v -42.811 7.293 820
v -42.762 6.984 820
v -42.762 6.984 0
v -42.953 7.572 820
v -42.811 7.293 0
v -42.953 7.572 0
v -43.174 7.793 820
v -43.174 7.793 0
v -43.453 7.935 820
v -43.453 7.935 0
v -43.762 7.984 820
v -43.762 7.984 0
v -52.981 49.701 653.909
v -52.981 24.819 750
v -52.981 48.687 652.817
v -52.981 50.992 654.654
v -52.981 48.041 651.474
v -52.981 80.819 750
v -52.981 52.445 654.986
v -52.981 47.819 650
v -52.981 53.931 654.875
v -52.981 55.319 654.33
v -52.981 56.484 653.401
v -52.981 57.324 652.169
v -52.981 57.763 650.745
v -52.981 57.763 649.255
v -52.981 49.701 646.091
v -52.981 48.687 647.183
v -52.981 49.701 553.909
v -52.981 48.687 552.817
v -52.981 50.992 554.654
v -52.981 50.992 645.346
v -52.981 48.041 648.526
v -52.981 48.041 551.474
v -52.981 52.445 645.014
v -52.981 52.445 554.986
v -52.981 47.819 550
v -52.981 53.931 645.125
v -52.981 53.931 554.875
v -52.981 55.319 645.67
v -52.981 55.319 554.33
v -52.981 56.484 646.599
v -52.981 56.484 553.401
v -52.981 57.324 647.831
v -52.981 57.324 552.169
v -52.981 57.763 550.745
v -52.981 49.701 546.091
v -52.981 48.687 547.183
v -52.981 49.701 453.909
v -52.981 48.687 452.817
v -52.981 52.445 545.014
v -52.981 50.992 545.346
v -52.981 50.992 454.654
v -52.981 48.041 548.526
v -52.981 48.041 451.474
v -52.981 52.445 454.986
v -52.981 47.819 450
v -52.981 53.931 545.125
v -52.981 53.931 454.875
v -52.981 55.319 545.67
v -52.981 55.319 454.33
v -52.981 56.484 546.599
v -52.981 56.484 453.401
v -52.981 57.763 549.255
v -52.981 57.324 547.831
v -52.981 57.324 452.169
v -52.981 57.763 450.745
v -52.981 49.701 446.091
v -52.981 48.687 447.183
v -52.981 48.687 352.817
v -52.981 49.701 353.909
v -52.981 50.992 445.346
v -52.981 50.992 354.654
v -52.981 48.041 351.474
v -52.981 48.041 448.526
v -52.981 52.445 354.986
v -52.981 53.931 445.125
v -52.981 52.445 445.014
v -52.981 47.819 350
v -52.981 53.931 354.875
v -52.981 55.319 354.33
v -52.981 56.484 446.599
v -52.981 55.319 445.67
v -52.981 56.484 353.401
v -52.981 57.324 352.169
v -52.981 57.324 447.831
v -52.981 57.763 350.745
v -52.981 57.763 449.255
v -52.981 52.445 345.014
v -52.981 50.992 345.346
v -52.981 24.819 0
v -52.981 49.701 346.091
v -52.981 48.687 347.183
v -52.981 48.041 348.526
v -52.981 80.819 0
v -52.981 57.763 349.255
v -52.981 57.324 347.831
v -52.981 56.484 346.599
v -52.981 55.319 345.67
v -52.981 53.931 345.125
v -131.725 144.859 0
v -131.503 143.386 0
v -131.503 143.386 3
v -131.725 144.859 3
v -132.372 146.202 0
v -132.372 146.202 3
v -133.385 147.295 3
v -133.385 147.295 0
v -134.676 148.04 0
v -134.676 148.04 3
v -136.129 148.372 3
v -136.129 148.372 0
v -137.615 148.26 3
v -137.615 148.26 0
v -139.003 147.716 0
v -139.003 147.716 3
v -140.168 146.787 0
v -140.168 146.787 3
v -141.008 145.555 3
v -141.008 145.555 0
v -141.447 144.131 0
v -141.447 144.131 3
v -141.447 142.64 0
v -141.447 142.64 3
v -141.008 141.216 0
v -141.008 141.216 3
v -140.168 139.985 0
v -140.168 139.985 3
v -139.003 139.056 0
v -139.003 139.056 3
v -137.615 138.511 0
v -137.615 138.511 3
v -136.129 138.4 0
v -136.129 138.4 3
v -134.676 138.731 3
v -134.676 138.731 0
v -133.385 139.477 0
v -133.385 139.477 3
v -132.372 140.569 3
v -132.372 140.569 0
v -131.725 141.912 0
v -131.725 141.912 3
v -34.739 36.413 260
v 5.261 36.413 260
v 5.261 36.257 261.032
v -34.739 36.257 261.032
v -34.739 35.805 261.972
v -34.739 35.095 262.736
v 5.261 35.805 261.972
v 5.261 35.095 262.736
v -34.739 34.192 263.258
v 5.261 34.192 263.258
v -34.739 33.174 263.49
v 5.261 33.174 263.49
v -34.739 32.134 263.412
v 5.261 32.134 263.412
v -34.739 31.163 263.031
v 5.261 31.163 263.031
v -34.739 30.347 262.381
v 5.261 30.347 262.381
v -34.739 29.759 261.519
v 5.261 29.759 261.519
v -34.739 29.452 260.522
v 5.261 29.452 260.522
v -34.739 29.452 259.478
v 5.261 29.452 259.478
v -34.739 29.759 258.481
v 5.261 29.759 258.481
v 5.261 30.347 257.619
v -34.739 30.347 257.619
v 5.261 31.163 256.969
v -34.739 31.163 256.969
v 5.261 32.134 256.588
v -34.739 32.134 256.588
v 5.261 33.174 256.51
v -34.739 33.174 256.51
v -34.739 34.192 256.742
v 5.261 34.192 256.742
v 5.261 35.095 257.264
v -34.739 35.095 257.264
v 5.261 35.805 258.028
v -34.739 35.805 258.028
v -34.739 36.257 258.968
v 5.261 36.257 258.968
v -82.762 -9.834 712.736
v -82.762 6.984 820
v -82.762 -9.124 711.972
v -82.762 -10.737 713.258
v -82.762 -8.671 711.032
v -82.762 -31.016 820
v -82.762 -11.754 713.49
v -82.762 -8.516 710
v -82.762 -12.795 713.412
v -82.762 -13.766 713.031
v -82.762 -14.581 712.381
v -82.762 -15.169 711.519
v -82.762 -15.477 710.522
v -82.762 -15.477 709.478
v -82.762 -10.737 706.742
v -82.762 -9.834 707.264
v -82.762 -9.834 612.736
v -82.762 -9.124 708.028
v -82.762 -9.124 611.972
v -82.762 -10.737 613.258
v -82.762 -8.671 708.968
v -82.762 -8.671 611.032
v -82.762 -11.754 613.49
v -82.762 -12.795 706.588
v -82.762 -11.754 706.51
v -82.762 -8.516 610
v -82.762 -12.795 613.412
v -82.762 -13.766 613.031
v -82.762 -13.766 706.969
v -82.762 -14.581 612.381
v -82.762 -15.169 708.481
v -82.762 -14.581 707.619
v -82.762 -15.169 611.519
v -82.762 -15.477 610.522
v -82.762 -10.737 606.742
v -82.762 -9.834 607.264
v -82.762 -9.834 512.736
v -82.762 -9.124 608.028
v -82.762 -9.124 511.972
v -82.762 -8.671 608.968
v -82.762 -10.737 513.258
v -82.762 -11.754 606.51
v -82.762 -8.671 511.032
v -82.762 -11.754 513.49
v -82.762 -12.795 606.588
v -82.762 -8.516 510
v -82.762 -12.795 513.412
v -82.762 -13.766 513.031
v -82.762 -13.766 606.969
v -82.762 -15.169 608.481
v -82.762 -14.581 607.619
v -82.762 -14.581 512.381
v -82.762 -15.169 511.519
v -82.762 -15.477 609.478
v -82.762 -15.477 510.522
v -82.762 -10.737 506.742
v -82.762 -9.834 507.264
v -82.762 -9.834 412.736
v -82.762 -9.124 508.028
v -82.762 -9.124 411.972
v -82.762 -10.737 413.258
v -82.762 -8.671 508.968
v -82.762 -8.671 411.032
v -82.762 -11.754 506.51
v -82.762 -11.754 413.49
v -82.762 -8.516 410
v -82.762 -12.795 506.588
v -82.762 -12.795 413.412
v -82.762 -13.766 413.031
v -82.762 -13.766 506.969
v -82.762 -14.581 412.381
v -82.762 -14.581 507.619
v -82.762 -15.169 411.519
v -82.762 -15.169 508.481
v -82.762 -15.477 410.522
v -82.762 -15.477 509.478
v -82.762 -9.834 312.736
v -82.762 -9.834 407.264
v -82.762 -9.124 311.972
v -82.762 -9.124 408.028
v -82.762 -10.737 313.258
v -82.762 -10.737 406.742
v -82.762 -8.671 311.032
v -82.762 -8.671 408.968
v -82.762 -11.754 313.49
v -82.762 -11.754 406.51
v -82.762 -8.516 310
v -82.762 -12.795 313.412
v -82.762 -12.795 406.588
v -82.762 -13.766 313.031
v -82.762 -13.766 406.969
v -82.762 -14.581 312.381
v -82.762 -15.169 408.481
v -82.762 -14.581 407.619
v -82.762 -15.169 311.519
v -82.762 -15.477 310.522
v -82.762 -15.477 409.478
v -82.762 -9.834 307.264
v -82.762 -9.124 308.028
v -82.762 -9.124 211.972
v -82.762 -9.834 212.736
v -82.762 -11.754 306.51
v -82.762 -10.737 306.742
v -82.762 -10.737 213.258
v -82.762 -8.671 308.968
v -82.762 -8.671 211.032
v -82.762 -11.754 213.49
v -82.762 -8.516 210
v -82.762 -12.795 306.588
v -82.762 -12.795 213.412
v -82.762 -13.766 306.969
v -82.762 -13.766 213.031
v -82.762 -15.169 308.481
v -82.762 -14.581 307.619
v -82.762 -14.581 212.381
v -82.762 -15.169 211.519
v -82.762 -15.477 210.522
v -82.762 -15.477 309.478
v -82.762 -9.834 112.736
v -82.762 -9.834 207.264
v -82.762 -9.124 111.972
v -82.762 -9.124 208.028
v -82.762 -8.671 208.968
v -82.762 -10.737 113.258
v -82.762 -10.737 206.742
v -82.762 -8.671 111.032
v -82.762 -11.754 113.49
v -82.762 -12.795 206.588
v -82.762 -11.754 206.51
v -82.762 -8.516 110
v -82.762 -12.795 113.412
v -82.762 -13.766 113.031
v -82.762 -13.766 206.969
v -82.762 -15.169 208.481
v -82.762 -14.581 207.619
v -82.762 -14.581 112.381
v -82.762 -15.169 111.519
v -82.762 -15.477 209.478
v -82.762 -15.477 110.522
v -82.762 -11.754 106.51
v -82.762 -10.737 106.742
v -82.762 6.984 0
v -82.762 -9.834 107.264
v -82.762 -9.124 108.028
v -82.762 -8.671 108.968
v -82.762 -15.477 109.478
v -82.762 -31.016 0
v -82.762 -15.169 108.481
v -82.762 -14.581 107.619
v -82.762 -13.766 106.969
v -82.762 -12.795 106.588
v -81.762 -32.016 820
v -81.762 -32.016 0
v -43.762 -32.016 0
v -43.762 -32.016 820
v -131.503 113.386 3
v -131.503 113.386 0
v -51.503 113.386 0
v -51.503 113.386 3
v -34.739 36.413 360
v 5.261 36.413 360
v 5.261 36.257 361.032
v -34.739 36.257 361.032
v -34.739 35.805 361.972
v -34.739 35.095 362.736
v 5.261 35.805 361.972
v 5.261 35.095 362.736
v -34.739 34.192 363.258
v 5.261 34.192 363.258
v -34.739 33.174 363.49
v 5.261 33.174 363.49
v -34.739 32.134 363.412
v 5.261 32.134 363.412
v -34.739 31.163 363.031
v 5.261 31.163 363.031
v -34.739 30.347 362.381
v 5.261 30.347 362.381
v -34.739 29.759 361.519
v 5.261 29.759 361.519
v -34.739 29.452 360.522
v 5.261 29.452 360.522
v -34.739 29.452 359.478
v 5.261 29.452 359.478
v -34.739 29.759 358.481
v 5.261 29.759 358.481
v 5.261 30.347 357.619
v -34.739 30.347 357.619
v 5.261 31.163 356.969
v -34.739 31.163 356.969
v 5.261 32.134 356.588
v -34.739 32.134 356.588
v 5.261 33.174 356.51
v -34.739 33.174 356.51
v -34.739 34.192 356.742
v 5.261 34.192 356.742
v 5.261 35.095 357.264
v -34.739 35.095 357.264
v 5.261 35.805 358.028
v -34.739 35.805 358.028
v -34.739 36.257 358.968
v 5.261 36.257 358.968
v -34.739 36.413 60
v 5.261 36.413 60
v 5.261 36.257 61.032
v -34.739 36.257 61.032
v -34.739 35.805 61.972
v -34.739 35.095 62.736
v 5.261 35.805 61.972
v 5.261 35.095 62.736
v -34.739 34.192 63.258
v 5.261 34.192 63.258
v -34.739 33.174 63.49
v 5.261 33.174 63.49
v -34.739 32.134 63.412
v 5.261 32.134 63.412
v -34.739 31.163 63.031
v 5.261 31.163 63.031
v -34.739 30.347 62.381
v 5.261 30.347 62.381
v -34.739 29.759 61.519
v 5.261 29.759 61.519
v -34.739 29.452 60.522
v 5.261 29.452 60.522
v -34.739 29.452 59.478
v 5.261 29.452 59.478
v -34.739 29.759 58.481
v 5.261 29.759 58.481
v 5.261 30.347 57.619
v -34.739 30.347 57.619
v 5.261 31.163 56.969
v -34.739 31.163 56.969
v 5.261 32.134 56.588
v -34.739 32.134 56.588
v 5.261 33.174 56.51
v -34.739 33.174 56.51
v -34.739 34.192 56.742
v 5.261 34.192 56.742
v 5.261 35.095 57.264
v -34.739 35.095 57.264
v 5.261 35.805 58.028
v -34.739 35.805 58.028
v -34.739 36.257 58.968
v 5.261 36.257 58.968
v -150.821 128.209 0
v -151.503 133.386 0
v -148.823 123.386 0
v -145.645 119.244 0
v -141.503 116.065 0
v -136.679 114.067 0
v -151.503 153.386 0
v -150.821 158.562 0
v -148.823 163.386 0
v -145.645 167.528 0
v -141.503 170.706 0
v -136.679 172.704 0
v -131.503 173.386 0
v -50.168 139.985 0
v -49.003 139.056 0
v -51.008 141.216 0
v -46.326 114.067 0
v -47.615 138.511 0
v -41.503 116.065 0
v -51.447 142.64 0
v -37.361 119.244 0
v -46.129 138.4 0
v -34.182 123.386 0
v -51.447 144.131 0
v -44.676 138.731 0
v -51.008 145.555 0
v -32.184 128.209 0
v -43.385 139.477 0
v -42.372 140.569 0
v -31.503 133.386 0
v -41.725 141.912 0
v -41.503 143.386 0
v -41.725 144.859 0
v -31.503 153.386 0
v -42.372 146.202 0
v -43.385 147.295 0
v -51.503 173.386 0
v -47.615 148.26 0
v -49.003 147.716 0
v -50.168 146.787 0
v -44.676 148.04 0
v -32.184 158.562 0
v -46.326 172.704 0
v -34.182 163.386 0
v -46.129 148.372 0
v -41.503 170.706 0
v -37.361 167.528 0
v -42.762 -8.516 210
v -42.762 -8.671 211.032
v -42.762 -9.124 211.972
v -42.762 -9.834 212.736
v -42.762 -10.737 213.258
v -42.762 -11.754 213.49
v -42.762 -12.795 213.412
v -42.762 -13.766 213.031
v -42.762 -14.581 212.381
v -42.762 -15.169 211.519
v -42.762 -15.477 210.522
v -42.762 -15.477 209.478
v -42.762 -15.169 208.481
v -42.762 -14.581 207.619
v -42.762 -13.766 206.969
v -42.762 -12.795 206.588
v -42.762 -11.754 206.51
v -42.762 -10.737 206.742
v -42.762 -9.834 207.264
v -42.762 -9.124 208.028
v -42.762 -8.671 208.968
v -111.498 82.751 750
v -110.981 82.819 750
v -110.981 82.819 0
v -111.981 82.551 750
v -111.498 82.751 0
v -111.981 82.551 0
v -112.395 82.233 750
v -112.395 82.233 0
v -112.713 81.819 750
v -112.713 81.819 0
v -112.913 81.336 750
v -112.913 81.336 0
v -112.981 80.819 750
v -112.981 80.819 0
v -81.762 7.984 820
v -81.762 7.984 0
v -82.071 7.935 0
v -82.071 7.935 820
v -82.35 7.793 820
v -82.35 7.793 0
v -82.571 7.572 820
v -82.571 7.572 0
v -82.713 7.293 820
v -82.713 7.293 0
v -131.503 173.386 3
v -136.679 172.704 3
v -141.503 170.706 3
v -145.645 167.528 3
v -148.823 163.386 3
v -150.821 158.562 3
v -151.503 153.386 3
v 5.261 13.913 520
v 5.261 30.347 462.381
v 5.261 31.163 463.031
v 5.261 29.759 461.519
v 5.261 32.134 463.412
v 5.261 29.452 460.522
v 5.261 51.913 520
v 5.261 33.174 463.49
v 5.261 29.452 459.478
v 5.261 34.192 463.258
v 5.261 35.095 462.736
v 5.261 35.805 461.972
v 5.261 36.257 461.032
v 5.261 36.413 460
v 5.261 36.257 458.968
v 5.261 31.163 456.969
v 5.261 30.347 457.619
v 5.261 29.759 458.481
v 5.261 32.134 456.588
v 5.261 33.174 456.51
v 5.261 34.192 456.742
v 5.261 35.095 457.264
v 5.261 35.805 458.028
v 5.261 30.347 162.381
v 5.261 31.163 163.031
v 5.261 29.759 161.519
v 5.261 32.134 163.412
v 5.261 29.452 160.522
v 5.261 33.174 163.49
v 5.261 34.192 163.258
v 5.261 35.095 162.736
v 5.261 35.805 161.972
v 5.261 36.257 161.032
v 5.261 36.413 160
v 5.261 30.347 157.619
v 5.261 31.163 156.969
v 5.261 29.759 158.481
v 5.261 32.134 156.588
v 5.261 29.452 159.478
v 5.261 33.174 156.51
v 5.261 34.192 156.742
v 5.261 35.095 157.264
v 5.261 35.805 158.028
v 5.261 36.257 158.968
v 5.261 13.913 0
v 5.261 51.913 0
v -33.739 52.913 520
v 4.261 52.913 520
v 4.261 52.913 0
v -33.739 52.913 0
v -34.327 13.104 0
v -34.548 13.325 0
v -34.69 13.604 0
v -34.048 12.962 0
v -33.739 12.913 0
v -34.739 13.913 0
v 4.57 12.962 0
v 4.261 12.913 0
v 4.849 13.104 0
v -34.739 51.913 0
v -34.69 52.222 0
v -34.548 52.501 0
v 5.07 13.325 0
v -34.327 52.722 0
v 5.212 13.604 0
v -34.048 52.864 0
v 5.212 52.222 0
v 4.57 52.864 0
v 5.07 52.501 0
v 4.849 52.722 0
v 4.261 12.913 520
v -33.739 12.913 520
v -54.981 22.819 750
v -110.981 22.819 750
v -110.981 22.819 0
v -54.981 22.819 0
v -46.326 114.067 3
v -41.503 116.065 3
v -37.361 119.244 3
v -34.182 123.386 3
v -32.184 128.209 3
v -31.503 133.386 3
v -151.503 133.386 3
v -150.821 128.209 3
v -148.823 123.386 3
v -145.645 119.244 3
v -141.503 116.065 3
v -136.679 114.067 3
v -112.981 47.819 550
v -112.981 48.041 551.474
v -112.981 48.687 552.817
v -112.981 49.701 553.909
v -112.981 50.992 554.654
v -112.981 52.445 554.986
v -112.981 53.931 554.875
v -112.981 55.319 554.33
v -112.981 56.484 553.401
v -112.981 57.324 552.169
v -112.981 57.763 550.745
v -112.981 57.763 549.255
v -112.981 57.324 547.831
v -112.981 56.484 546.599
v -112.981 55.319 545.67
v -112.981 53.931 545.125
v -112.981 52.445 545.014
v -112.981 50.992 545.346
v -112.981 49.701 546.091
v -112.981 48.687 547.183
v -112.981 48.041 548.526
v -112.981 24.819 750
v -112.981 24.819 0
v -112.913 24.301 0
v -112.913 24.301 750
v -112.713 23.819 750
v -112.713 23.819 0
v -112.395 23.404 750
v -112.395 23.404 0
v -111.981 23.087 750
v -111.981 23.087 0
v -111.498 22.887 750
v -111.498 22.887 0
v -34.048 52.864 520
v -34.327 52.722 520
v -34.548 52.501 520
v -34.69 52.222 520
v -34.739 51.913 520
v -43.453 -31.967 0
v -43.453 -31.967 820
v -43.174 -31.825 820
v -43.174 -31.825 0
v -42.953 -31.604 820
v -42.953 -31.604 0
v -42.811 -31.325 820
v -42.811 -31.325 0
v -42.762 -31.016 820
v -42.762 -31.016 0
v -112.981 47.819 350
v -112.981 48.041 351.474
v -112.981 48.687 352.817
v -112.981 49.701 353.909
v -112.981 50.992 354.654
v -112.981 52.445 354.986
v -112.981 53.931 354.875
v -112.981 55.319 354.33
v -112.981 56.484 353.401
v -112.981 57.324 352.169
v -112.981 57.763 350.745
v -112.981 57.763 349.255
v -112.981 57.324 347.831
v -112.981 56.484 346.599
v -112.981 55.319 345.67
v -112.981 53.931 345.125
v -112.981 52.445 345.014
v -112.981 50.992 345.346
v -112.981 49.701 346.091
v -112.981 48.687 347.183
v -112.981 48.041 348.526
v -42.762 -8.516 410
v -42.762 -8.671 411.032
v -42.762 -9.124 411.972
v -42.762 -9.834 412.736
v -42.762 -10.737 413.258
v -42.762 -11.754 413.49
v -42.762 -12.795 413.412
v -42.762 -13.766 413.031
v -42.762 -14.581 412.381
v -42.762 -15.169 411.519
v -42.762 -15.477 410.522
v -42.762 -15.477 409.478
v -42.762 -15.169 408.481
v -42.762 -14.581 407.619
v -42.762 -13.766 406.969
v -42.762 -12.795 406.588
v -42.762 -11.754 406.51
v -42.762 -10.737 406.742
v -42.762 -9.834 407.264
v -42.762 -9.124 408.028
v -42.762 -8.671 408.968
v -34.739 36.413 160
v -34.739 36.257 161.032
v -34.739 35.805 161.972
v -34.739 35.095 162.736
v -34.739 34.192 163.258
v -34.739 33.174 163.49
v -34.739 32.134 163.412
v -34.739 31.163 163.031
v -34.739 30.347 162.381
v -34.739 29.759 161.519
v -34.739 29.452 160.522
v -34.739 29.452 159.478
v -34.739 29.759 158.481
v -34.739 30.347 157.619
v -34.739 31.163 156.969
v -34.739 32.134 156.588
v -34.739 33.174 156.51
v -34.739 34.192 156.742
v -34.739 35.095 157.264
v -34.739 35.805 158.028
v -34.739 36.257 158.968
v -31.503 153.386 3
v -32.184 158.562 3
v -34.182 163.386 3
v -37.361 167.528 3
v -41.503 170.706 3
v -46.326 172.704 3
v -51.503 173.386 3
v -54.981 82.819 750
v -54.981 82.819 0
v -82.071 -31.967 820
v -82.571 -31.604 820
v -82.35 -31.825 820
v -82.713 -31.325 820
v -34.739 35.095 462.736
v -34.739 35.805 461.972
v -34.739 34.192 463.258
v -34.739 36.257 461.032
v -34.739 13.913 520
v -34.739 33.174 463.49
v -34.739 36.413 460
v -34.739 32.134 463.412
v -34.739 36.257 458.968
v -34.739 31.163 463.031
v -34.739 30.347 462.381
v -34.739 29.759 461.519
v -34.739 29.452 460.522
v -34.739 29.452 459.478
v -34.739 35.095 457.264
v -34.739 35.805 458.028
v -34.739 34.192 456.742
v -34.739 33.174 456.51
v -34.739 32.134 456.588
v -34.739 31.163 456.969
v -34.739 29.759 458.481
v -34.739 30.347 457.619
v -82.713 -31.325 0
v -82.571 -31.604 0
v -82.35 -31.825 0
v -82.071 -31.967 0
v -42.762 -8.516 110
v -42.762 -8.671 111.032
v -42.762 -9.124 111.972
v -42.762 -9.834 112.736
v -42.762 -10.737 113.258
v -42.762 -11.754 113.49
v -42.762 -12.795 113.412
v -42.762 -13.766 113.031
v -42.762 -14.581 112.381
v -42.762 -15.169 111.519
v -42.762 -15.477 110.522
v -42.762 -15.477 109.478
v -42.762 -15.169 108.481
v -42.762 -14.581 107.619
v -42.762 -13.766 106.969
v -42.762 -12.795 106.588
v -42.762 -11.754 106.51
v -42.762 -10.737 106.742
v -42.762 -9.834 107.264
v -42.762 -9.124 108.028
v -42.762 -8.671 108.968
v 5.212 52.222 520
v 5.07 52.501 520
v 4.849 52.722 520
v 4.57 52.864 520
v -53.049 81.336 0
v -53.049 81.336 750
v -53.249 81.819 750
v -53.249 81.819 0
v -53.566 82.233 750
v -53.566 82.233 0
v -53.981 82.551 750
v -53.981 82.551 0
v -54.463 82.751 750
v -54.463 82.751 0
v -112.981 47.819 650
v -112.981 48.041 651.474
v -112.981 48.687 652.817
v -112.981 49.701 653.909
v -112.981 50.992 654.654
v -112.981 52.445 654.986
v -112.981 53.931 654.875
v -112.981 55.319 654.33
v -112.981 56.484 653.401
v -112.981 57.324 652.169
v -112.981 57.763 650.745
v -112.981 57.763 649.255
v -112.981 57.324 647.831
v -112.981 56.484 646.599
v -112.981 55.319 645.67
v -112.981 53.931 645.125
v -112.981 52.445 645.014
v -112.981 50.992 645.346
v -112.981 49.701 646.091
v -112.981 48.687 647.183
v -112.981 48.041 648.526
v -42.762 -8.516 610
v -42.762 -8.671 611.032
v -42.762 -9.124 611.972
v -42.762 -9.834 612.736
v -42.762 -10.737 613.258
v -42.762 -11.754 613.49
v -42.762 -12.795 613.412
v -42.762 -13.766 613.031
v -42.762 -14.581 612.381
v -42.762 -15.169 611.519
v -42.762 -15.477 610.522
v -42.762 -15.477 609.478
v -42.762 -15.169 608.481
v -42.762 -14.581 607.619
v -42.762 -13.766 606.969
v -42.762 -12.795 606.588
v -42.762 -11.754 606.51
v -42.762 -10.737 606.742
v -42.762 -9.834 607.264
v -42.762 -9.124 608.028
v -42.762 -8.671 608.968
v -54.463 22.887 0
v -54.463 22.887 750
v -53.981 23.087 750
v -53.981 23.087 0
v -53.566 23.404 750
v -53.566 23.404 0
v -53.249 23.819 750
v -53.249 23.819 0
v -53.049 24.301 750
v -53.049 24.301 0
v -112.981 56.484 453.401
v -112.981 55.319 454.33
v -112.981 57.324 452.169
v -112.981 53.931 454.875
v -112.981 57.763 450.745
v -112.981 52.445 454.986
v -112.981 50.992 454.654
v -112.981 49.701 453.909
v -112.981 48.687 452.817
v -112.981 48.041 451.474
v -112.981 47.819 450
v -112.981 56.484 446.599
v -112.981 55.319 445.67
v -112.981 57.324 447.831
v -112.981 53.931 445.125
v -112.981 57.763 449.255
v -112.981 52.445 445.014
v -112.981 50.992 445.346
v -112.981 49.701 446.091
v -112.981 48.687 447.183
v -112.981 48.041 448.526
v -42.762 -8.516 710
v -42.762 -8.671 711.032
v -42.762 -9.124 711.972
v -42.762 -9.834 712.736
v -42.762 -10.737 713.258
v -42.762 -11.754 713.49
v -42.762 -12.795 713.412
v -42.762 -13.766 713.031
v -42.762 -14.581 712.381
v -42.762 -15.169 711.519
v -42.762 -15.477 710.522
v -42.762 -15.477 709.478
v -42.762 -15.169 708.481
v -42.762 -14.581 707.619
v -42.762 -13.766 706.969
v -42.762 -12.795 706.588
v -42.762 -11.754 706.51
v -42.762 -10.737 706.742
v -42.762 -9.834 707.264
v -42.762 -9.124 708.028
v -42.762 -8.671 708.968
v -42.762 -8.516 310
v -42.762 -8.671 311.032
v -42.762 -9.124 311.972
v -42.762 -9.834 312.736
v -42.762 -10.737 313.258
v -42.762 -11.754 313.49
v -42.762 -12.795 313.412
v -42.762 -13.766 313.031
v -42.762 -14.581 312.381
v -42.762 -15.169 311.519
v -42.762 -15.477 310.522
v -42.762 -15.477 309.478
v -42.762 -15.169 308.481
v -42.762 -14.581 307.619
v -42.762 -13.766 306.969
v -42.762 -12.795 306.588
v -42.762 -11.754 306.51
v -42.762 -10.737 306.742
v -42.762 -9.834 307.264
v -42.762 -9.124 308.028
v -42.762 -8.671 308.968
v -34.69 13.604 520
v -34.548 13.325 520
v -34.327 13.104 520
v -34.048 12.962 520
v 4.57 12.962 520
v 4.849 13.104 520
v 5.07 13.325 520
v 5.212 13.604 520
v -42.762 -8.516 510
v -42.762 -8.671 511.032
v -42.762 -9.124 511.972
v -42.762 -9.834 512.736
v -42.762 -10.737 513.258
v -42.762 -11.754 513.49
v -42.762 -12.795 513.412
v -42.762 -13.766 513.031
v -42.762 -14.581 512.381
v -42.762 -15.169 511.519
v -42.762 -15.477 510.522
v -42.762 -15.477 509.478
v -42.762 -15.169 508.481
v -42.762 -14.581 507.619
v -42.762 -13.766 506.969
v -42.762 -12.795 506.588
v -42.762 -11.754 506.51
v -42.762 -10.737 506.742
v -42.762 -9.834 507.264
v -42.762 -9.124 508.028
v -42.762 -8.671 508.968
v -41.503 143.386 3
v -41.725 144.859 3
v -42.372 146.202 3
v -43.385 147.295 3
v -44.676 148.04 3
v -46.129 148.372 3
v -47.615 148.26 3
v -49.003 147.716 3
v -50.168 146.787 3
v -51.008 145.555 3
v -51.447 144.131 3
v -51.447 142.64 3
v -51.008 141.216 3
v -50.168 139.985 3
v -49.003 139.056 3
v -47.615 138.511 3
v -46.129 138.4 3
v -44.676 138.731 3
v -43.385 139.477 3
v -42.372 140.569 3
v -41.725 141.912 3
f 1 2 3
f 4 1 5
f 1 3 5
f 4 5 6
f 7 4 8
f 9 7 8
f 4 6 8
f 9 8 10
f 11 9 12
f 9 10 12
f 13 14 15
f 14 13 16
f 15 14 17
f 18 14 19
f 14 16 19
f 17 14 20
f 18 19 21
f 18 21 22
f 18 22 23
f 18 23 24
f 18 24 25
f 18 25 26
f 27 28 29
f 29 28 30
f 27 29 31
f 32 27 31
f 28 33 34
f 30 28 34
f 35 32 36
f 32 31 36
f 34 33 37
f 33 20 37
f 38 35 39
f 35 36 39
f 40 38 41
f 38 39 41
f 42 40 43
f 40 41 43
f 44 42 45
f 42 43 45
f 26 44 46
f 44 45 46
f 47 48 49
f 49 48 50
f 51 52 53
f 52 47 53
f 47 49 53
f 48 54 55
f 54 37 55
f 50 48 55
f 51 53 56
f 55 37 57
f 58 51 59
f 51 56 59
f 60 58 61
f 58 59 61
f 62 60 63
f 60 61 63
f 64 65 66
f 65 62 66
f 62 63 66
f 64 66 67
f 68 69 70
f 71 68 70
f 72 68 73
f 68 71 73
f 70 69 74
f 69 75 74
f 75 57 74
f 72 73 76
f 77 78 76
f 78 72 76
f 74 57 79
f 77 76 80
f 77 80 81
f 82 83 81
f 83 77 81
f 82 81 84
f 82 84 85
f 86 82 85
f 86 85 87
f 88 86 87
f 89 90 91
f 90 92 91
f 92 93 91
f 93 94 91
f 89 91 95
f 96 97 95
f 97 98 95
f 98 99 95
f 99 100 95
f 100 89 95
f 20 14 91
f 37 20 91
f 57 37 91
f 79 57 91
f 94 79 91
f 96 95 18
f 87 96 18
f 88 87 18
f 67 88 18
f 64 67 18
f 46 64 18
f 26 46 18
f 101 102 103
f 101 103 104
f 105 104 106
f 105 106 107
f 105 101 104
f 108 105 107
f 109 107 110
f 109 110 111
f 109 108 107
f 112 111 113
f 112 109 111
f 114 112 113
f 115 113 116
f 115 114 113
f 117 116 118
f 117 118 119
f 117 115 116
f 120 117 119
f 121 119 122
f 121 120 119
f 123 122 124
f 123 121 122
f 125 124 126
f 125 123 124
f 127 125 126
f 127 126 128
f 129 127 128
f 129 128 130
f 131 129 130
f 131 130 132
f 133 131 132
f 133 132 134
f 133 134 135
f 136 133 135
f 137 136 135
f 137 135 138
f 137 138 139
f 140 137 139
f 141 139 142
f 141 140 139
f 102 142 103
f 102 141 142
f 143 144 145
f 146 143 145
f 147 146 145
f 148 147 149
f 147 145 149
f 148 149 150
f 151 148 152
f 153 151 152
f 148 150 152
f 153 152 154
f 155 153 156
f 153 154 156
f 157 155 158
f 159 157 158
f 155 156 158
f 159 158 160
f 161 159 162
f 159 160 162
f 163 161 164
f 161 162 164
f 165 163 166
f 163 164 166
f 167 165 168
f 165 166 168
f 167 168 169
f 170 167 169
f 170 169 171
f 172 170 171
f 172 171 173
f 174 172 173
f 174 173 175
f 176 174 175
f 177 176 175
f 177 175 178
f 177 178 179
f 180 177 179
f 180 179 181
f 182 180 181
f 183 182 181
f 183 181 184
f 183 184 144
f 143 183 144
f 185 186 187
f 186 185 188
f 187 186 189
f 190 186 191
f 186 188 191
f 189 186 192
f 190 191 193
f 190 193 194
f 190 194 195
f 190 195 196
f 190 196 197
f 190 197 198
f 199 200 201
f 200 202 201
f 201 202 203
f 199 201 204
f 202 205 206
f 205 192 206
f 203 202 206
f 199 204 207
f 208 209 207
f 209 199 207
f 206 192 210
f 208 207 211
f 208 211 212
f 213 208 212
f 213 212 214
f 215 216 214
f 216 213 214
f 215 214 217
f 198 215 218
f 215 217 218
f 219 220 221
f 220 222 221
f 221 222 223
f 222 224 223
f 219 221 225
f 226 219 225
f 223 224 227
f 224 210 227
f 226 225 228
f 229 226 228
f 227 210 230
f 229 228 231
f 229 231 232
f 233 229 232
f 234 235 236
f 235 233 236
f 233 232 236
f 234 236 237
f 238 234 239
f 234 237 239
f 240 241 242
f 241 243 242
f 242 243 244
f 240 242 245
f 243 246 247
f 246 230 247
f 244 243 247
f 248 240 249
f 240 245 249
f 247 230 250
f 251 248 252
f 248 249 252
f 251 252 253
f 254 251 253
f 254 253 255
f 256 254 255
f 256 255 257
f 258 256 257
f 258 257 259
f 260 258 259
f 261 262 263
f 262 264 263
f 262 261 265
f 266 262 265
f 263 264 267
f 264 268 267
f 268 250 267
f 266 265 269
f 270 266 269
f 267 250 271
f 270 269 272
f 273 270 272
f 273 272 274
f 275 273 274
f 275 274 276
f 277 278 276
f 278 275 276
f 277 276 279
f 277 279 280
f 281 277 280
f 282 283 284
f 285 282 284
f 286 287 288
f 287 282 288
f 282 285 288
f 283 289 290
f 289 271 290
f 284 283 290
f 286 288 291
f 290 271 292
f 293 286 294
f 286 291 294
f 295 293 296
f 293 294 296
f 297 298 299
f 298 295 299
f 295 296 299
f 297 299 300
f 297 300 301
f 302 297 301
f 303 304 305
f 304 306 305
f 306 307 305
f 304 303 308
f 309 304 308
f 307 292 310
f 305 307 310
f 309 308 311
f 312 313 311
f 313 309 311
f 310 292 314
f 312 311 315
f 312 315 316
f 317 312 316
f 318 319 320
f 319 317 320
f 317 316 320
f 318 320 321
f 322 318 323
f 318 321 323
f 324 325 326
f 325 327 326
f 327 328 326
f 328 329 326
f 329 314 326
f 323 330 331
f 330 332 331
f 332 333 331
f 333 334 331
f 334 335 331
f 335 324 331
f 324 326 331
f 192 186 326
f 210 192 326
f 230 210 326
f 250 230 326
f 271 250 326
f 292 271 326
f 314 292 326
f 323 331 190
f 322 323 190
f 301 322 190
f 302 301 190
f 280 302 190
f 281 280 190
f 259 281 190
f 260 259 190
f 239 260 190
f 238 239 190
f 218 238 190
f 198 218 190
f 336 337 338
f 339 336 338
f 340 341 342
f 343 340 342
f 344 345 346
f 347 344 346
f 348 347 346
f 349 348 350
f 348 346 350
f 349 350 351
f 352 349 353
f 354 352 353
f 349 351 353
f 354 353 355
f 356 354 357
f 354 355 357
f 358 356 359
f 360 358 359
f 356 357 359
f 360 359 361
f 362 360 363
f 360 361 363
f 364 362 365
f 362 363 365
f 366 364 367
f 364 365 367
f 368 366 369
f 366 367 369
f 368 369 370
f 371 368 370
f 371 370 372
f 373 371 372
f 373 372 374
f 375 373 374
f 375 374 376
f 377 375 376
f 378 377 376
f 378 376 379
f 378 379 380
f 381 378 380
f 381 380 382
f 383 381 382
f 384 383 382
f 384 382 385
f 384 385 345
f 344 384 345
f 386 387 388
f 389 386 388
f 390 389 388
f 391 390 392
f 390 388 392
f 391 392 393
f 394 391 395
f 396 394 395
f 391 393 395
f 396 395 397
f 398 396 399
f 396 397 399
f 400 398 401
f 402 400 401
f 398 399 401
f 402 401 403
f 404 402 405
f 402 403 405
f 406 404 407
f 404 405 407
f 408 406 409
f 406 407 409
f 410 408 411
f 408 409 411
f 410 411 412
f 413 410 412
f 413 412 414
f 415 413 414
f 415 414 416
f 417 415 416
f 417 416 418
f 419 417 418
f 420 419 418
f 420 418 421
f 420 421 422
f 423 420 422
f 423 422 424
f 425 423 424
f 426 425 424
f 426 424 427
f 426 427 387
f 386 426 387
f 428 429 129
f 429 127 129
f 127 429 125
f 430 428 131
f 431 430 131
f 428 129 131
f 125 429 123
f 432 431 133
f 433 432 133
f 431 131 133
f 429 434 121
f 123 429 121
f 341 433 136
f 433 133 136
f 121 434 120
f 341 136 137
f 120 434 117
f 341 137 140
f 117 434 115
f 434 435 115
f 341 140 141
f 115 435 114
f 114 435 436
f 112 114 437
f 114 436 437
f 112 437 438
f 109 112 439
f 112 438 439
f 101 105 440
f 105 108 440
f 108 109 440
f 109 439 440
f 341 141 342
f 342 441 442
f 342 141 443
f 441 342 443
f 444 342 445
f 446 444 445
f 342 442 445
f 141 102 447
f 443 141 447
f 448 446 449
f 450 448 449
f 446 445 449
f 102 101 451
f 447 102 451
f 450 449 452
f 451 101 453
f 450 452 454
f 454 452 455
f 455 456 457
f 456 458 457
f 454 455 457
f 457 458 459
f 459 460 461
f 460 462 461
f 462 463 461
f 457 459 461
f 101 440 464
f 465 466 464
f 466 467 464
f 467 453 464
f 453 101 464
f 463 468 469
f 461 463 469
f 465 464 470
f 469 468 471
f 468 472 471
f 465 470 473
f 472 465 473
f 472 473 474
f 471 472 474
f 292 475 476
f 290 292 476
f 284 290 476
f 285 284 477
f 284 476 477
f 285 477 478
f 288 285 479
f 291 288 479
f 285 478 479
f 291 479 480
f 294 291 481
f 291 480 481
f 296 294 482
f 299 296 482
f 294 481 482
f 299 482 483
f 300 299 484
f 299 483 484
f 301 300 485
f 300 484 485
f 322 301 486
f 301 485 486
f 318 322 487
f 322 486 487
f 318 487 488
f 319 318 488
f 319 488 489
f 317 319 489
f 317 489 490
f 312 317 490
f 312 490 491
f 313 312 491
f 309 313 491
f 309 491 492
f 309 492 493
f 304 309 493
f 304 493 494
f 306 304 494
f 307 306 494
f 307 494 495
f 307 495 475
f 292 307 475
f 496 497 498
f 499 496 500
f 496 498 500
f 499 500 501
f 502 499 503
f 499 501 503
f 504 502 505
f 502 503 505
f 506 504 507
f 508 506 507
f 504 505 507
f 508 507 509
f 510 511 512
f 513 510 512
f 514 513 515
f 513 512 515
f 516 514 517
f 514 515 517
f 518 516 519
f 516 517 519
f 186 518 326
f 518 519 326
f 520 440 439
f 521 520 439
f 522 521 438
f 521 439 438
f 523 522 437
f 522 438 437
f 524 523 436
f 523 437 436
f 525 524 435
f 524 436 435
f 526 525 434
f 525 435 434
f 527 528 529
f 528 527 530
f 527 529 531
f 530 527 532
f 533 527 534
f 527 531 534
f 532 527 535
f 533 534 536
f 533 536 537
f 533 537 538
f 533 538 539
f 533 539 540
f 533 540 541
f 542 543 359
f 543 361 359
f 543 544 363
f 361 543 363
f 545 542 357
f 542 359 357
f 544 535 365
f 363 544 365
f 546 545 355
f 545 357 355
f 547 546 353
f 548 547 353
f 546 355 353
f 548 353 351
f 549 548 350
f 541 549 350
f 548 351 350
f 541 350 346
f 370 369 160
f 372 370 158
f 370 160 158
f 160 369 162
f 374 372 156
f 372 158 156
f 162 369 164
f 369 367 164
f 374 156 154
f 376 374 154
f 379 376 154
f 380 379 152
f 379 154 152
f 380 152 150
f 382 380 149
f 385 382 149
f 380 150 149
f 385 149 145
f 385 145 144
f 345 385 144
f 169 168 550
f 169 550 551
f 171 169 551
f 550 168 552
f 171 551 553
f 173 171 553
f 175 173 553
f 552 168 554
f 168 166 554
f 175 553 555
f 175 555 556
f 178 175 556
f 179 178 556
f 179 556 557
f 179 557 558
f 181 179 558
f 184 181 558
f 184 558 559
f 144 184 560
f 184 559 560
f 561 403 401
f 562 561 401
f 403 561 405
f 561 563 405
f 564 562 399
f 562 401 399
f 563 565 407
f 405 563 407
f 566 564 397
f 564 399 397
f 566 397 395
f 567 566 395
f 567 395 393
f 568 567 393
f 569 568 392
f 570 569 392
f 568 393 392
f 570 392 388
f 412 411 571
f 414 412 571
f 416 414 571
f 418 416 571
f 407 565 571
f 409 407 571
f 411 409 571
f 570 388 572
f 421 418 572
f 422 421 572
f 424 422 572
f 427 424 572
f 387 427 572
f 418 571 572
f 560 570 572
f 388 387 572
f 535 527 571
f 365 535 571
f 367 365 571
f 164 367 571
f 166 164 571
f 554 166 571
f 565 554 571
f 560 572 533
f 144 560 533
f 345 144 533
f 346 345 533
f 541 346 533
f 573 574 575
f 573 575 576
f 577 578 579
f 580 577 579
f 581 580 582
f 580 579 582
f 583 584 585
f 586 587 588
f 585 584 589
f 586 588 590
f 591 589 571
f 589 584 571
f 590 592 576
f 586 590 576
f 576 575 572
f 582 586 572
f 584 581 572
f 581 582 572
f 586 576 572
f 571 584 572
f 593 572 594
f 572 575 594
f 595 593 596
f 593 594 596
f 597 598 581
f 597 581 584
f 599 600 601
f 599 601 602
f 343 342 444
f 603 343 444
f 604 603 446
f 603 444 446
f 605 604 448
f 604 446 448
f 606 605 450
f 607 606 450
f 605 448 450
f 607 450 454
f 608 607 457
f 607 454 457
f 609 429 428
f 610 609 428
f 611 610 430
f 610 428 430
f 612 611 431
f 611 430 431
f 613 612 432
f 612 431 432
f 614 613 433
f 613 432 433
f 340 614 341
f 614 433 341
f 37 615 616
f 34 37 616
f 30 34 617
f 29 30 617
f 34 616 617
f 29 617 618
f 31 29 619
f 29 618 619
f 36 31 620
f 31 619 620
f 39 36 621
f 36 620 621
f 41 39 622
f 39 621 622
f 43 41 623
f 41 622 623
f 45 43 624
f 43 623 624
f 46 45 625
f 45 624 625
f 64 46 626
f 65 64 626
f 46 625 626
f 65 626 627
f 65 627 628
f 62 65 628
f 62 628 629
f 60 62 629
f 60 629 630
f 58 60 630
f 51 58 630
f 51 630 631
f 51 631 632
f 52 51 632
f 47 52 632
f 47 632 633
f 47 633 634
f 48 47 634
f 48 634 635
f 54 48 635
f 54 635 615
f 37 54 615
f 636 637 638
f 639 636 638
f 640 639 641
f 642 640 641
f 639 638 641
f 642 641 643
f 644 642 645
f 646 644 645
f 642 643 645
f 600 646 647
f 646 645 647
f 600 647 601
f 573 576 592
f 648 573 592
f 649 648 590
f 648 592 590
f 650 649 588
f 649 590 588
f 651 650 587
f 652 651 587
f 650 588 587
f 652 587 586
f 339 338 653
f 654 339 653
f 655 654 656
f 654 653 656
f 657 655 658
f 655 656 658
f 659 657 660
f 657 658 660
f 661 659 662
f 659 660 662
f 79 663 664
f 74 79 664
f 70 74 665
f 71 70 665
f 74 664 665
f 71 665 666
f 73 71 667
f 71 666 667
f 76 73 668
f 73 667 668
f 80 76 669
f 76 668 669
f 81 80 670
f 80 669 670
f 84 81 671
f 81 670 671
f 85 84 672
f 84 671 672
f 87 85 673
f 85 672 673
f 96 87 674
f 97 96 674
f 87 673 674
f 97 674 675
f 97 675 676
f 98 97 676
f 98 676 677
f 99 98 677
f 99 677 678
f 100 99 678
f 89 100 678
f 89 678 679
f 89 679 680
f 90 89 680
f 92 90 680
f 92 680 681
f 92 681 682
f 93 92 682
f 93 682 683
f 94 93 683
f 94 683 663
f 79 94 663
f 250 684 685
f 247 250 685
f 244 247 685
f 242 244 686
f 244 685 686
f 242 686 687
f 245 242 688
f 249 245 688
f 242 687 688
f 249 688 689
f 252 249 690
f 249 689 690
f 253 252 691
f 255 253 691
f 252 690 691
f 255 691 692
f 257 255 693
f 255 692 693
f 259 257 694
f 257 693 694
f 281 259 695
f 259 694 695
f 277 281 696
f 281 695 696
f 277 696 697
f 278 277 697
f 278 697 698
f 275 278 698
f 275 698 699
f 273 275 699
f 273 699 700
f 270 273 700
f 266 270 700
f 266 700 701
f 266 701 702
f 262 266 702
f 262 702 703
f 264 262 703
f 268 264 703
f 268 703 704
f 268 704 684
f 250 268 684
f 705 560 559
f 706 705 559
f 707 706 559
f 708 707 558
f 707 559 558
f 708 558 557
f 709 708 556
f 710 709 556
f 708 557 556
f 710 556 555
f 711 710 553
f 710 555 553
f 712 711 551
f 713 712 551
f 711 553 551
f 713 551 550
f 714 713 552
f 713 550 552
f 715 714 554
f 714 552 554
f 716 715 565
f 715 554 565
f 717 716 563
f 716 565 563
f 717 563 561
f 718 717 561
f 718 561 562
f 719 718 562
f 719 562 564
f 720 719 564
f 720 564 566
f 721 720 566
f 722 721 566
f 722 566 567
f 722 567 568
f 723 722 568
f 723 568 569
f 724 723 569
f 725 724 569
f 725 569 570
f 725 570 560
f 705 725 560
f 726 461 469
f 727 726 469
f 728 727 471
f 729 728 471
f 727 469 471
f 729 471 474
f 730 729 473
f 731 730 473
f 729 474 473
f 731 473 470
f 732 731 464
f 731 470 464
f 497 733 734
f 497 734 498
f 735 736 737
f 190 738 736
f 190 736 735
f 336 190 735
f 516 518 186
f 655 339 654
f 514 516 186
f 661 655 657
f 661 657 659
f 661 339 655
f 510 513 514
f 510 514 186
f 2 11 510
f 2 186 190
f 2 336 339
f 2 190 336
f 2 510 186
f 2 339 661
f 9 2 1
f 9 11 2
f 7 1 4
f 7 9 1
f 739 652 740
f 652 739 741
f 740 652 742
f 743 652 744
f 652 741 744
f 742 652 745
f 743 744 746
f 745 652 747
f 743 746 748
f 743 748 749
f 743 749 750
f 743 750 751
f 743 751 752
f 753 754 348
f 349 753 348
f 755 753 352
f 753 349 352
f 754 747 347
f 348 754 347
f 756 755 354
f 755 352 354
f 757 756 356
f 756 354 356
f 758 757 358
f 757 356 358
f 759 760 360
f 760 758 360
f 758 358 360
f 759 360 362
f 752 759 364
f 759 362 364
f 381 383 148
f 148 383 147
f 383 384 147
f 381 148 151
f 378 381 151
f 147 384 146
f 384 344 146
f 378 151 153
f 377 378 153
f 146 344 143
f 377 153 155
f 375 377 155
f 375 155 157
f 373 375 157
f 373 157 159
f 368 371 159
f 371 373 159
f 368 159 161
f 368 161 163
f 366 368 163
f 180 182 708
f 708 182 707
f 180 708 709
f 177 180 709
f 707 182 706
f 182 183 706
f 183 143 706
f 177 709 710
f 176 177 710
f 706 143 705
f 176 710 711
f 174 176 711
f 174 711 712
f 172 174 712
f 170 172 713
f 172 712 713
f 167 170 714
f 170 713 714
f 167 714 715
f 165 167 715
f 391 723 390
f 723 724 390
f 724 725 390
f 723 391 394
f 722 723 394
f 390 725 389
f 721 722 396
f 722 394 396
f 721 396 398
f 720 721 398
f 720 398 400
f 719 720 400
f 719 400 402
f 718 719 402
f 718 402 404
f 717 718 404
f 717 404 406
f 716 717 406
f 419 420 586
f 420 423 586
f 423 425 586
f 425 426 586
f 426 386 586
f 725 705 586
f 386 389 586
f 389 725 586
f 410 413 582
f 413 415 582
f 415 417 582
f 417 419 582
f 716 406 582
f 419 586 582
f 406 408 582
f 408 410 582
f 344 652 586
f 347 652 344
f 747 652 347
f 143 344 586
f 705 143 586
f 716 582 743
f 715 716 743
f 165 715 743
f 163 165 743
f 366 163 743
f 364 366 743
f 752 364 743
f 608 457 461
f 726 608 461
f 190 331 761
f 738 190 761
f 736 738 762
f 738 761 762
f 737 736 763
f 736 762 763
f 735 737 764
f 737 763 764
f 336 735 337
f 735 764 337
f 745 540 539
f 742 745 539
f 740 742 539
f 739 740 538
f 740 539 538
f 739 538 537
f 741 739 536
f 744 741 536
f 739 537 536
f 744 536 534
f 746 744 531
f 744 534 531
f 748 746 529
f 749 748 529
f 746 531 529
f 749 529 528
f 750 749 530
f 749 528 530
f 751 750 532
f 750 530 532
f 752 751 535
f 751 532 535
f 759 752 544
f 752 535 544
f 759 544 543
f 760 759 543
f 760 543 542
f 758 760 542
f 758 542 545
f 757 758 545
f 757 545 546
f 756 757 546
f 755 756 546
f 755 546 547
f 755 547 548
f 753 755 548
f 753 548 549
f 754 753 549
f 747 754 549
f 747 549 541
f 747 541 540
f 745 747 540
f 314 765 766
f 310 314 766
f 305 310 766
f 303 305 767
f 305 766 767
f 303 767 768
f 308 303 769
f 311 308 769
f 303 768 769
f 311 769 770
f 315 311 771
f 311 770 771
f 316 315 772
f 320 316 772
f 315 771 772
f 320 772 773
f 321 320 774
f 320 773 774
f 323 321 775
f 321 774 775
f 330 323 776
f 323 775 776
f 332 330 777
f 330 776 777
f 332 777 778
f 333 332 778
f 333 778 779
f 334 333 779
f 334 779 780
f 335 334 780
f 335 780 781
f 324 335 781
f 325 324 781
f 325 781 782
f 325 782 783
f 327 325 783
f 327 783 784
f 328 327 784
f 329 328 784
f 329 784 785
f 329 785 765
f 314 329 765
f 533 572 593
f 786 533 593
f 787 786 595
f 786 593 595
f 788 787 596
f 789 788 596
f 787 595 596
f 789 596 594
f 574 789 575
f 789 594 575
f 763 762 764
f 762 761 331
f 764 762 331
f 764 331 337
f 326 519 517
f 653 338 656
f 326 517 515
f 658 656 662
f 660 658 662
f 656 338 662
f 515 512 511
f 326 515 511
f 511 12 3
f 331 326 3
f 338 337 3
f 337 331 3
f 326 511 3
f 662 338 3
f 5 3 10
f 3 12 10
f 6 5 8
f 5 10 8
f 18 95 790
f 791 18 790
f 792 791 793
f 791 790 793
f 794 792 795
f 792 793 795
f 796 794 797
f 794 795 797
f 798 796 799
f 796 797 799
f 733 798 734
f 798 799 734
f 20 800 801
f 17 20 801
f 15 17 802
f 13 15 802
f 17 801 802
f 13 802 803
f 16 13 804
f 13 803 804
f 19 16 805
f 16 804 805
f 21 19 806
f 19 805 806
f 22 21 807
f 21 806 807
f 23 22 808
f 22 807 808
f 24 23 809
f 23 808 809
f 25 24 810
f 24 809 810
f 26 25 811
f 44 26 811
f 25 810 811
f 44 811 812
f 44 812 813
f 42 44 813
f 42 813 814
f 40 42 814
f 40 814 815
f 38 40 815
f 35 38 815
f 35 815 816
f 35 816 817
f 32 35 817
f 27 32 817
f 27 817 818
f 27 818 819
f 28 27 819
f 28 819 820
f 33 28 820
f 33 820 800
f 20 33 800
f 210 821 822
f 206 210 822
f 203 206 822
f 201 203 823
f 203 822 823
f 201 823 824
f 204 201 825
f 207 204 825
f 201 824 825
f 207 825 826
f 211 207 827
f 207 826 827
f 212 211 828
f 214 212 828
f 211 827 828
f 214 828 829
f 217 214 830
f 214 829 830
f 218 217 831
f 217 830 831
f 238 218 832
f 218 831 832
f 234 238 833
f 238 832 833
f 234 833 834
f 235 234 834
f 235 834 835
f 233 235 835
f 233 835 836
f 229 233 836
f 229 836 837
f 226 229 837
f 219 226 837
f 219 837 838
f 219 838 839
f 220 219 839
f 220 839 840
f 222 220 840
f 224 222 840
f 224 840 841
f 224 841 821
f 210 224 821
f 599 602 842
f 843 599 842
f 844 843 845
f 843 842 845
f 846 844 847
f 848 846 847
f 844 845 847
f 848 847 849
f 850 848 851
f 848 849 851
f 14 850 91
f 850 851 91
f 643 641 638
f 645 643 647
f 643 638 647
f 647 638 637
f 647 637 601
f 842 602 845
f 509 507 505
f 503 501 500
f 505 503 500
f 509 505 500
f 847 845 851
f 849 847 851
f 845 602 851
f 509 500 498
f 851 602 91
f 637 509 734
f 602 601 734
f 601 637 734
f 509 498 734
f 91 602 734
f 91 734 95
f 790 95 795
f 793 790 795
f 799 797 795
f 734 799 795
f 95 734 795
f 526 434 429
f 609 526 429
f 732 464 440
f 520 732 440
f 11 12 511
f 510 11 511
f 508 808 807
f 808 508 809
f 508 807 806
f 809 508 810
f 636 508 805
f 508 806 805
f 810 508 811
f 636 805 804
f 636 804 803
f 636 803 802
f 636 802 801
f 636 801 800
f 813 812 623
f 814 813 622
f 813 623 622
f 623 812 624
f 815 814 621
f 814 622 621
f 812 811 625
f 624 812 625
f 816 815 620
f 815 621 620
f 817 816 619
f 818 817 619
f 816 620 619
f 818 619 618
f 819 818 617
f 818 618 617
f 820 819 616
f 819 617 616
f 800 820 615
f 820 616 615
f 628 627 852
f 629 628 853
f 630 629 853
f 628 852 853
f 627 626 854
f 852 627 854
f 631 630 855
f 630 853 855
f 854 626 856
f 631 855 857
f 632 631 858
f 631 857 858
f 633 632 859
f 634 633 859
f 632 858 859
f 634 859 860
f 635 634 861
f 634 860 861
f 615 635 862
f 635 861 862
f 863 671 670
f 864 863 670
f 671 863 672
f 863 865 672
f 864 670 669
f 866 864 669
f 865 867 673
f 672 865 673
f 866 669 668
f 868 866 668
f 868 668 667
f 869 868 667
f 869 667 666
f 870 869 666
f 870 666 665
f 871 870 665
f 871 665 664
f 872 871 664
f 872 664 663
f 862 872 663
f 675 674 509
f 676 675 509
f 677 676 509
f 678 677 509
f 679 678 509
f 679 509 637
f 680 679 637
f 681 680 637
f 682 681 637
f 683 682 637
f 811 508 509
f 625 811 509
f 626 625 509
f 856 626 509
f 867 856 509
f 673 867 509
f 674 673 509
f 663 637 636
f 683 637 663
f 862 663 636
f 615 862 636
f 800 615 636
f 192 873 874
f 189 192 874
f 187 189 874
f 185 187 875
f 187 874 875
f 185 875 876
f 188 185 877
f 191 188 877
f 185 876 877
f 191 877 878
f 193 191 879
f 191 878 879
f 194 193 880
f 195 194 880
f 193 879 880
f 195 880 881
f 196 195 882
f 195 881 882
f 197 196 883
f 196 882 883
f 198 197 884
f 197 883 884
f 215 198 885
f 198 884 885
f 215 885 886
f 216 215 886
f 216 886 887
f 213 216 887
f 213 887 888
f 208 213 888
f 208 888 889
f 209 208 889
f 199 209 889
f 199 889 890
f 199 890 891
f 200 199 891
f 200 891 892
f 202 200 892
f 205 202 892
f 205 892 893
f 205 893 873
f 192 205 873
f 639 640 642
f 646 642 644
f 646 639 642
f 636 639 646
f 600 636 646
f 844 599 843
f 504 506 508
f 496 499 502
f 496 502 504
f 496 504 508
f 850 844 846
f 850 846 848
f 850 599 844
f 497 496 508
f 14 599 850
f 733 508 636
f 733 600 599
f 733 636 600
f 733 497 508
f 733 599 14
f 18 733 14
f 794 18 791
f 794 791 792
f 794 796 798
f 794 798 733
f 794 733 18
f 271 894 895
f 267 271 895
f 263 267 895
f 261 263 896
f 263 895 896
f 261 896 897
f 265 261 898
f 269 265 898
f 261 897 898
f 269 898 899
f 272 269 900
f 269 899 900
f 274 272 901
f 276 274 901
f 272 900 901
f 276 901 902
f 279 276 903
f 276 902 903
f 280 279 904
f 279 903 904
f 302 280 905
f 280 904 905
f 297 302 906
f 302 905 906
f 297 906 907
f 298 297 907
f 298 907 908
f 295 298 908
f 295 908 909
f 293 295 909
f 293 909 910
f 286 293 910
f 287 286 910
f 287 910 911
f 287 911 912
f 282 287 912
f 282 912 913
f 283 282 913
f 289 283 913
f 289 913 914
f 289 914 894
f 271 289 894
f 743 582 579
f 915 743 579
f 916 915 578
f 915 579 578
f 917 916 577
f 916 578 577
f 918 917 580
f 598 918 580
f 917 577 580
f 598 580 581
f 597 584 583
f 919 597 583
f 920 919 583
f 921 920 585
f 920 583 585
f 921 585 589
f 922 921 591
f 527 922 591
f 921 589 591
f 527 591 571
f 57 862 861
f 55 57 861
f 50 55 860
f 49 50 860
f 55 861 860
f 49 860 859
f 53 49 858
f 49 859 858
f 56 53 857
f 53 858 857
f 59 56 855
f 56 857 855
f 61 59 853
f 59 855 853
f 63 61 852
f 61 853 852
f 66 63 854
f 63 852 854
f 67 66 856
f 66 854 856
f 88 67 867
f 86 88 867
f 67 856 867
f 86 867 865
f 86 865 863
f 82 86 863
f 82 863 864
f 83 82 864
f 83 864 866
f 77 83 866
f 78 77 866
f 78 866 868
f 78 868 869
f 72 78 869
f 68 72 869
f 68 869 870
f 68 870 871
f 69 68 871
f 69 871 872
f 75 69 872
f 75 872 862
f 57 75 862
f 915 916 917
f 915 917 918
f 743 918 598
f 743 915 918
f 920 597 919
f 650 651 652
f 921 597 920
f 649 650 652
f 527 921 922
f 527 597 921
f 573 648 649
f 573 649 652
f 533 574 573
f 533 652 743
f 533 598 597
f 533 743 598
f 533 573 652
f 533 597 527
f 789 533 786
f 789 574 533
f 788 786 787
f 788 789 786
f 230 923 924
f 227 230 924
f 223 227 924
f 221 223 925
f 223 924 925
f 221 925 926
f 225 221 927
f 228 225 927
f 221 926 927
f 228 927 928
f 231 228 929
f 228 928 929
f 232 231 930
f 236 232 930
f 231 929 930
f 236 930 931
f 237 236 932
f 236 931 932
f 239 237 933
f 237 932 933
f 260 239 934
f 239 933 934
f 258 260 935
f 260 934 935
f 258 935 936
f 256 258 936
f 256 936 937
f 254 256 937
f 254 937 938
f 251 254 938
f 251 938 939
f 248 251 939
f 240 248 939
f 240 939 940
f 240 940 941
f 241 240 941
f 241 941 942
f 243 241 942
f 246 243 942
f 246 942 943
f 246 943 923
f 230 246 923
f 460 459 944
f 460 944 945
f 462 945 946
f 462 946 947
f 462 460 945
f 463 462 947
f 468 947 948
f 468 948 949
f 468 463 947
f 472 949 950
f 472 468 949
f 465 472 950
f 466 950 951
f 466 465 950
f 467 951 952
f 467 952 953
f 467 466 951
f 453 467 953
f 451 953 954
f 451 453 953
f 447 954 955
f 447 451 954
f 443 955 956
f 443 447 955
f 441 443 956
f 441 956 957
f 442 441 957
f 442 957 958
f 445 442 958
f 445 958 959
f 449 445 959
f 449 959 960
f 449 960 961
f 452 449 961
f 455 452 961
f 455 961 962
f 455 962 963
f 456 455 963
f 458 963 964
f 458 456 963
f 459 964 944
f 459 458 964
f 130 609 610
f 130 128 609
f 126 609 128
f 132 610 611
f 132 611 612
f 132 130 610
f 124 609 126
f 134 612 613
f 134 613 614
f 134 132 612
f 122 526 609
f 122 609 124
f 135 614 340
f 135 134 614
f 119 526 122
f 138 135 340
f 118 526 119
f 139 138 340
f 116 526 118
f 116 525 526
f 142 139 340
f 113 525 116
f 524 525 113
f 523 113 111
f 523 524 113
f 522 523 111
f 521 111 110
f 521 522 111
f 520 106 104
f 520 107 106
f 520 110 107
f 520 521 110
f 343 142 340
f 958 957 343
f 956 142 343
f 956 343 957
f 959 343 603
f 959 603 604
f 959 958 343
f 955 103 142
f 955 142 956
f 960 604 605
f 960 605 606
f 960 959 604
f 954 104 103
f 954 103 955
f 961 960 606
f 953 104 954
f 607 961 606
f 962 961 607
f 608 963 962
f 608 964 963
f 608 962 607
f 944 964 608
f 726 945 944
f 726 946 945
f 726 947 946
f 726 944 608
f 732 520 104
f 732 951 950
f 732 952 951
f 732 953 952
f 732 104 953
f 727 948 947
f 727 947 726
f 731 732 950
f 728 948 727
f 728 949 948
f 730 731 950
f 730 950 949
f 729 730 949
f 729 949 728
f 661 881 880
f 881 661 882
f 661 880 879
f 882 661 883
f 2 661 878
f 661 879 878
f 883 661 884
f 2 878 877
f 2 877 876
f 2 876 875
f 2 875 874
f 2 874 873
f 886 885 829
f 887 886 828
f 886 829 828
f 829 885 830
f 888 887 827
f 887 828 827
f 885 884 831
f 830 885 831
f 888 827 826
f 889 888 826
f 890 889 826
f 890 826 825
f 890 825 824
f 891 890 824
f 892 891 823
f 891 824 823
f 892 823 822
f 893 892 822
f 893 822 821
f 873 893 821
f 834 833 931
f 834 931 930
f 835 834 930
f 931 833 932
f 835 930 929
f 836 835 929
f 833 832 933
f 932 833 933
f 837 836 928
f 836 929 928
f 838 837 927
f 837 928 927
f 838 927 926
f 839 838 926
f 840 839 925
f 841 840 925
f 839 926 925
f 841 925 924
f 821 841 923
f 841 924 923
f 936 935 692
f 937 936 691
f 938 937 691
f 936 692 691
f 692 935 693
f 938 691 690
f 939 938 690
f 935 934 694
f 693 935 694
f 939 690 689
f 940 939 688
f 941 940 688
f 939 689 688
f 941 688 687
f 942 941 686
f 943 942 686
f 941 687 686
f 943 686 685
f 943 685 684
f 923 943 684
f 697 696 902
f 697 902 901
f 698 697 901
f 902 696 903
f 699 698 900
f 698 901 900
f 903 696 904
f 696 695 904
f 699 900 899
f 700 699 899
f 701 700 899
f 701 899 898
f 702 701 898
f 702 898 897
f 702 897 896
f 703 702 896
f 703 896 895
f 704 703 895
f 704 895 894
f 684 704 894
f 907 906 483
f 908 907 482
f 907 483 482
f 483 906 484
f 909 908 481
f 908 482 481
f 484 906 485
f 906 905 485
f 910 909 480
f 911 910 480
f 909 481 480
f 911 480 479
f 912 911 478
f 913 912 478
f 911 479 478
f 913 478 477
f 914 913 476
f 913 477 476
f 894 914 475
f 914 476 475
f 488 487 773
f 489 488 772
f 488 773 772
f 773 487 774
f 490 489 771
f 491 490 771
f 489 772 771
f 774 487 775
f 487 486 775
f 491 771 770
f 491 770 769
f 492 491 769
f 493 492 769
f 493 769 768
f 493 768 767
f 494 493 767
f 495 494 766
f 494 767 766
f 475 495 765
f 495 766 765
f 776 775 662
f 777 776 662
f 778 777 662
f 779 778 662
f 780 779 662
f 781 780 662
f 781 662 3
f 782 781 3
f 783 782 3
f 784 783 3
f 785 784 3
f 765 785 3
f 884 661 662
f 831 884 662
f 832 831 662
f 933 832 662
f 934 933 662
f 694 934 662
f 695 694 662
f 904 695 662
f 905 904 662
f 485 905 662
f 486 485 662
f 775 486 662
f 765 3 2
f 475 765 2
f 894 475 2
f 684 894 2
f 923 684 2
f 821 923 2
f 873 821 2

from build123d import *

# Parameters (mm, degrees)
F1_DEPTH  = 750
F3_DEPTH  = 520
F5_DEPTH  = 820
F6_R      = 5
F7_DEPTH  = 118.2429433809
F8_R      = 5
F9_DEPTH  = 3
F10_R     = 3.5
F11_DEPTH = 108.7418225238
F12_R     = 3.5
F13_DEPTH = 156.7649812082


with BuildPart() as f1:
    # F0 (on Top) → F1 (new body)
    with BuildSketch(Plane.XY):
        with BuildLine():
            Line((-54.9806970424, 82.8186849058), (-110.9806970424, 82.8186849058))
            ThreePointArc((-110.9806970424, 82.8186849058), (-112.3949106048, 82.2328984681), (-112.9806970424, 80.8186849058))
            Line((-112.9806970424, 80.8186849058), (-112.9806970424, 24.8186849058))
            ThreePointArc((-112.9806970424, 24.8186849058), (-112.3949106048, 23.4044713434), (-110.9806970424, 22.8186849058))
            Line((-110.9806970424, 22.8186849058), (-54.9806970424, 22.8186849058))
            ThreePointArc((-54.9806970424, 22.8186849058), (-53.56648348, 23.4044713434), (-52.9806970424, 24.8186849058))
            Line((-52.9806970424, 24.8186849058), (-52.9806970424, 80.8186849058))
            ThreePointArc((-52.9806970424, 80.8186849058), (-53.56648348, 82.2328984681), (-54.9806970424, 82.8186849058))
        make_face()
    extrude(amount=F1_DEPTH)

    # F6 (on face) → F7 (cut, through all)
    with BuildSketch(Plane(origin=(-112.9806970424, 0, 0), x_dir=(0, -1, 0), z_dir=(-1, 0, 0))):
        with Locations((-52.8186849058, 650)):
            Circle(F6_R)
        with Locations((-52.8186849058, 550)):
            Circle(F6_R)
        with Locations((-52.8186849058, 450)):
            Circle(F6_R)
        with Locations((-52.8186849058, 350)):
            Circle(F6_R)
    extrude(amount=-F7_DEPTH, mode=Mode.SUBTRACT)


with BuildPart() as f3:
    # F2 (on Top) → F3 (new body)
    with BuildSketch(Plane.XY):
        with BuildLine():
            Line((4.2612463385, 52.912817955), (-33.7387536615, 52.912817955))
            ThreePointArc((-33.7387536615, 52.912817955), (-34.4458604427, 52.6199247362), (-34.7387536615, 51.912817955))
            Line((-34.7387536615, 51.912817955), (-34.7387536615, 13.912817955))
            ThreePointArc((-34.7387536615, 13.912817955), (-34.4458604427, 13.2057111738), (-33.7387536615, 12.912817955))
            Line((-33.7387536615, 12.912817955), (4.2612463385, 12.912817955))
            ThreePointArc((4.2612463385, 12.912817955), (4.9683531197, 13.2057111738), (5.2612463385, 13.912817955))
            Line((5.2612463385, 13.912817955), (5.2612463385, 51.912817955))
            ThreePointArc((5.2612463385, 51.912817955), (4.9683531197, 52.6199247362), (4.2612463385, 52.912817955))
        make_face()
    extrude(amount=F3_DEPTH)

    # F12 (on face) → F13 (cut, through all)
    with BuildSketch(Plane.YZ.offset(5.2612463385)):
        with Locations((32.912817955, 260)):
            Circle(F12_R)
        with Locations((32.912817955, 360)):
            Circle(F12_R)
        with Locations((32.912817955, 460)):
            Circle(F12_R)
        with Locations((32.912817955, 160)):
            Circle(F12_R)
        with Locations((32.912817955, 60)):
            Circle(F12_R)
    extrude(amount=-F13_DEPTH, mode=Mode.SUBTRACT)


with BuildPart() as f5:
    # F4 (on Top) → F5 (new body)
    with BuildSketch(Plane.XY):
        with BuildLine():
            Line((-43.7619123459, 7.984181866), (-81.7619123459, 7.984181866))
            ThreePointArc((-81.7619123459, 7.984181866), (-82.4690191271, 7.6912886472), (-82.7619123459, 6.984181866))
            Line((-82.7619123459, 6.984181866), (-82.7619123459, -31.015818134))
            ThreePointArc((-82.7619123459, -31.015818134), (-82.4690191271, -31.7229249151), (-81.7619123459, -32.015818134))
            Line((-81.7619123459, -32.015818134), (-43.7619123459, -32.015818134))
            ThreePointArc((-43.7619123459, -32.015818134), (-43.0548055647, -31.7229249151), (-42.7619123459, -31.015818134))
            Line((-42.7619123459, -31.015818134), (-42.7619123459, 6.984181866))
            ThreePointArc((-42.7619123459, 6.984181866), (-43.0548055647, 7.6912886472), (-43.7619123459, 7.984181866))
        make_face()
    extrude(amount=F5_DEPTH)

    # F10 (on face) → F11 (cut, through all)
    with BuildSketch(Plane.YZ.offset(-42.7619123459)):
        with Locations((-12.015818134, 410)):
            Circle(F10_R)
        with Locations((-12.015818134, 510)):
            Circle(F10_R)
        with Locations((-12.015818134, 610)):
            Circle(F10_R)
        with Locations((-12.015818134, 710)):
            Circle(F10_R)
        with Locations((-12.015818134, 310)):
            Circle(F10_R)
        with Locations((-12.015818134, 210)):
            Circle(F10_R)
        with Locations((-12.015818134, 110)):
            Circle(F10_R)
    extrude(amount=-F11_DEPTH, mode=Mode.SUBTRACT)


with BuildPart() as f9:
    # F8 (on Top) → F9 (new body)
    with BuildSketch(Plane.XY):
        with BuildLine():
            Line((-51.5027348697, 173.3856686354), (-131.5027348697, 173.3856686354))
            ThreePointArc((-131.5027348697, 173.3856686354), (-145.6448704934, 167.5278042591), (-151.5027348697, 153.3856686354))
            Line((-151.5027348697, 153.3856686354), (-151.5027348697, 133.3856686354))
            ThreePointArc((-151.5027348697, 133.3856686354), (-145.6448704934, 119.2435330116), (-131.5027348697, 113.3856686354))
            Line((-131.5027348697, 113.3856686354), (-51.5027348697, 113.3856686354))
            ThreePointArc((-51.5027348697, 113.3856686354), (-37.360599246, 119.2435330116), (-31.5027348697, 133.3856686354))
            Line((-31.5027348697, 133.3856686354), (-31.5027348697, 153.3856686354))
            ThreePointArc((-31.5027348697, 153.3856686354), (-37.360599246, 167.5278042591), (-51.5027348697, 173.3856686354))
        make_face()
        with Locations((-46.5027348697, 143.3856686354)):
            Circle(F8_R, mode=Mode.SUBTRACT)
        with Locations((-136.5027348697, 143.3856686354)):
            Circle(F8_R, mode=Mode.SUBTRACT)
    extrude(amount=F9_DEPTH)


solid = Compound([f1.part, f3.part, f5.part, f9.part])
